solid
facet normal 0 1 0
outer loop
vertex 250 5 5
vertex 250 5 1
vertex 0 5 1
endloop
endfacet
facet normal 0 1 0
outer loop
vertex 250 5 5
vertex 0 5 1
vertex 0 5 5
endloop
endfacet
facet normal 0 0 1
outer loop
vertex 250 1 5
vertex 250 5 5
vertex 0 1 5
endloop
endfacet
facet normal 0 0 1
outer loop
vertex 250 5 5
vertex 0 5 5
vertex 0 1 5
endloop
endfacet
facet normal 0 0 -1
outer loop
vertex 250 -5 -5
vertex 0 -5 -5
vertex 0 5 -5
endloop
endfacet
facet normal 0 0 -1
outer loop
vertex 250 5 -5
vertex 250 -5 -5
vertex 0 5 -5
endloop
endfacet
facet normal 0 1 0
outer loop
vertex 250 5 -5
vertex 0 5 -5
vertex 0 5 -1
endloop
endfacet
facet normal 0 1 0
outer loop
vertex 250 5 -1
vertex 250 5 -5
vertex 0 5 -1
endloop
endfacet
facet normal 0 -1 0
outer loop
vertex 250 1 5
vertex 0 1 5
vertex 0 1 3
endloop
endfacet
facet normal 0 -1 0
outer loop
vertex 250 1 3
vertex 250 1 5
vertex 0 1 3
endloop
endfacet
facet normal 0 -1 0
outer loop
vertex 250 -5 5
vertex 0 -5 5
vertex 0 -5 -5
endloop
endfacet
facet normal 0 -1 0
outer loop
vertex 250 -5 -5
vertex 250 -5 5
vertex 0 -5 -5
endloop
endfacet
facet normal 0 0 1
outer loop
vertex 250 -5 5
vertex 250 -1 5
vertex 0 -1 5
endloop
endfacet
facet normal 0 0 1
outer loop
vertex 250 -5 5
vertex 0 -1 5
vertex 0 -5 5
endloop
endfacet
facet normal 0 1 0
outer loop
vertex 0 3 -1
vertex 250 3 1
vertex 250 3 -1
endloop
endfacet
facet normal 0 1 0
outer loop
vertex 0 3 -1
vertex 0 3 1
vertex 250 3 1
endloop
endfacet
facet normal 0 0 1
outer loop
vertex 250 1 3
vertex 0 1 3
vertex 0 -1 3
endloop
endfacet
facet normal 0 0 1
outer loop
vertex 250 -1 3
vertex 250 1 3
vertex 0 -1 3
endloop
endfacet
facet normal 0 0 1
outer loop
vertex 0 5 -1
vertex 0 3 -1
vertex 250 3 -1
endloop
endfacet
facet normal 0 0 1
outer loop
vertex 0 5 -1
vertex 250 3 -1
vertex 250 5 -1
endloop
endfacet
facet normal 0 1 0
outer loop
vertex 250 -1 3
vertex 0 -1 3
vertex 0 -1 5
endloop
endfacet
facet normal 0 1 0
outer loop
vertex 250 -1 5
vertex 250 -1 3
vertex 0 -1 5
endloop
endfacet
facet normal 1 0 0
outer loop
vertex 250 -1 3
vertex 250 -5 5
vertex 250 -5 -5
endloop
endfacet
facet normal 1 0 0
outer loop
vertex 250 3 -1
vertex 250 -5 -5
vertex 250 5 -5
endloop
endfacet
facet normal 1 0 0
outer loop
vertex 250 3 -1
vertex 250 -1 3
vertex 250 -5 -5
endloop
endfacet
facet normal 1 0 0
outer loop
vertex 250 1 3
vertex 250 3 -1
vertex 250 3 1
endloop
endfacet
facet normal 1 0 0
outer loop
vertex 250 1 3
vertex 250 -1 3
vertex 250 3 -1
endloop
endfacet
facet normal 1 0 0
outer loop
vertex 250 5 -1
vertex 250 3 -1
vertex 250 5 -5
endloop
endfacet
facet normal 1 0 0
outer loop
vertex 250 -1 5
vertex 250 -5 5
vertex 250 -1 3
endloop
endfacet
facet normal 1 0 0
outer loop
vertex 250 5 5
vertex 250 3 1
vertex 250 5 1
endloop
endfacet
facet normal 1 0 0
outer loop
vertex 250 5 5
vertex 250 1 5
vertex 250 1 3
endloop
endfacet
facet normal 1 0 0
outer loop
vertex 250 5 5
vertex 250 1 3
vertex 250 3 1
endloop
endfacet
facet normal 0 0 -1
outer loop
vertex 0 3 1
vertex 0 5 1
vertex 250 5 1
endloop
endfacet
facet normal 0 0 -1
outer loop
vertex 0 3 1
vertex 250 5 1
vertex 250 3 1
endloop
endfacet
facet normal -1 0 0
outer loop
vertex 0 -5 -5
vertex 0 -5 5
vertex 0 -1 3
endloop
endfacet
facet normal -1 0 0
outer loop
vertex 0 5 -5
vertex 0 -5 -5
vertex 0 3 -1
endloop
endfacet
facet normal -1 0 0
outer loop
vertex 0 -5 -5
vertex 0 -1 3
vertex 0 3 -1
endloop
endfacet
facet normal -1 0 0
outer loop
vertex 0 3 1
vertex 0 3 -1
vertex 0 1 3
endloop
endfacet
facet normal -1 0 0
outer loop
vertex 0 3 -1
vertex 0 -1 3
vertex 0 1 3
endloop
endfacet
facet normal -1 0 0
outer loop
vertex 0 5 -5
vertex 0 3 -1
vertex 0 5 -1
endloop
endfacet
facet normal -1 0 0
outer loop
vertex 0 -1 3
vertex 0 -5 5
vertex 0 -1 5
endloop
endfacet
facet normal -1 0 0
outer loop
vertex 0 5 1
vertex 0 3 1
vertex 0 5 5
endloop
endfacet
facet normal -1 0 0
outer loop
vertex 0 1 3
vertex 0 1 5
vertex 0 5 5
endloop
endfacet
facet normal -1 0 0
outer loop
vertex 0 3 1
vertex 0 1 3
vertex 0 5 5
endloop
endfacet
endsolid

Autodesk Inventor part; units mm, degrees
ref_plane "YZ Plane" through (0, 0, 0) normal (1, 0, 0) x (0, 1, 0)
ref_plane "XZ Plane" through (0, 0, 0) normal (0, 1, 0) x (-1, 0, 0)
ref_plane "XY Plane" through (0, 0, 0) normal (0, 0, 1) x (1, 0, 0)
sketch "スケッチ1" plane through (0, 0, 0) normal (1, 0, 0) x (0, 1, 0)
  line L0 (-5, -5) -> (5, -5)
  line L1 (5, -5) -> (5, 5)
  line L2 (5, 5) -> (-5, 5)
  line L3 (-5, 5) -> (-5, -5)
  line L4 (-1, 5) -> (1, 5)
  line L5 (1, 5) -> (1, 3)
  line L6 (1, 3) -> (-1, 3)
  line L7 (-1, 3) -> (-1, 5)
  line L8 (3, -1) -> (5, -1)
  line L9 (5, -1) -> (5, 1)
  line L10 (5, 1) -> (3, 1)
  line L11 (3, 1) -> (3, -1)
  point P0 (0, 0)
  dimension "d0" = 5
  dimension "d1" = 5
  dimension "d2" = 5
  dimension "d3" = 5
  dimension "d4" = 2
  dimension "d5" = 1
  dimension "d6" = 2
  dimension "d7" = 1
  dimension "d8" = 2
  dimension "d9" = 2
extrude "押し出し1" add sketch "スケッチ1" along normal blind 250 contours L3 L2 L7 L6 L5 L1 L10 L11 L8 L0
properties part number "banper" material "PET プラスチック"
